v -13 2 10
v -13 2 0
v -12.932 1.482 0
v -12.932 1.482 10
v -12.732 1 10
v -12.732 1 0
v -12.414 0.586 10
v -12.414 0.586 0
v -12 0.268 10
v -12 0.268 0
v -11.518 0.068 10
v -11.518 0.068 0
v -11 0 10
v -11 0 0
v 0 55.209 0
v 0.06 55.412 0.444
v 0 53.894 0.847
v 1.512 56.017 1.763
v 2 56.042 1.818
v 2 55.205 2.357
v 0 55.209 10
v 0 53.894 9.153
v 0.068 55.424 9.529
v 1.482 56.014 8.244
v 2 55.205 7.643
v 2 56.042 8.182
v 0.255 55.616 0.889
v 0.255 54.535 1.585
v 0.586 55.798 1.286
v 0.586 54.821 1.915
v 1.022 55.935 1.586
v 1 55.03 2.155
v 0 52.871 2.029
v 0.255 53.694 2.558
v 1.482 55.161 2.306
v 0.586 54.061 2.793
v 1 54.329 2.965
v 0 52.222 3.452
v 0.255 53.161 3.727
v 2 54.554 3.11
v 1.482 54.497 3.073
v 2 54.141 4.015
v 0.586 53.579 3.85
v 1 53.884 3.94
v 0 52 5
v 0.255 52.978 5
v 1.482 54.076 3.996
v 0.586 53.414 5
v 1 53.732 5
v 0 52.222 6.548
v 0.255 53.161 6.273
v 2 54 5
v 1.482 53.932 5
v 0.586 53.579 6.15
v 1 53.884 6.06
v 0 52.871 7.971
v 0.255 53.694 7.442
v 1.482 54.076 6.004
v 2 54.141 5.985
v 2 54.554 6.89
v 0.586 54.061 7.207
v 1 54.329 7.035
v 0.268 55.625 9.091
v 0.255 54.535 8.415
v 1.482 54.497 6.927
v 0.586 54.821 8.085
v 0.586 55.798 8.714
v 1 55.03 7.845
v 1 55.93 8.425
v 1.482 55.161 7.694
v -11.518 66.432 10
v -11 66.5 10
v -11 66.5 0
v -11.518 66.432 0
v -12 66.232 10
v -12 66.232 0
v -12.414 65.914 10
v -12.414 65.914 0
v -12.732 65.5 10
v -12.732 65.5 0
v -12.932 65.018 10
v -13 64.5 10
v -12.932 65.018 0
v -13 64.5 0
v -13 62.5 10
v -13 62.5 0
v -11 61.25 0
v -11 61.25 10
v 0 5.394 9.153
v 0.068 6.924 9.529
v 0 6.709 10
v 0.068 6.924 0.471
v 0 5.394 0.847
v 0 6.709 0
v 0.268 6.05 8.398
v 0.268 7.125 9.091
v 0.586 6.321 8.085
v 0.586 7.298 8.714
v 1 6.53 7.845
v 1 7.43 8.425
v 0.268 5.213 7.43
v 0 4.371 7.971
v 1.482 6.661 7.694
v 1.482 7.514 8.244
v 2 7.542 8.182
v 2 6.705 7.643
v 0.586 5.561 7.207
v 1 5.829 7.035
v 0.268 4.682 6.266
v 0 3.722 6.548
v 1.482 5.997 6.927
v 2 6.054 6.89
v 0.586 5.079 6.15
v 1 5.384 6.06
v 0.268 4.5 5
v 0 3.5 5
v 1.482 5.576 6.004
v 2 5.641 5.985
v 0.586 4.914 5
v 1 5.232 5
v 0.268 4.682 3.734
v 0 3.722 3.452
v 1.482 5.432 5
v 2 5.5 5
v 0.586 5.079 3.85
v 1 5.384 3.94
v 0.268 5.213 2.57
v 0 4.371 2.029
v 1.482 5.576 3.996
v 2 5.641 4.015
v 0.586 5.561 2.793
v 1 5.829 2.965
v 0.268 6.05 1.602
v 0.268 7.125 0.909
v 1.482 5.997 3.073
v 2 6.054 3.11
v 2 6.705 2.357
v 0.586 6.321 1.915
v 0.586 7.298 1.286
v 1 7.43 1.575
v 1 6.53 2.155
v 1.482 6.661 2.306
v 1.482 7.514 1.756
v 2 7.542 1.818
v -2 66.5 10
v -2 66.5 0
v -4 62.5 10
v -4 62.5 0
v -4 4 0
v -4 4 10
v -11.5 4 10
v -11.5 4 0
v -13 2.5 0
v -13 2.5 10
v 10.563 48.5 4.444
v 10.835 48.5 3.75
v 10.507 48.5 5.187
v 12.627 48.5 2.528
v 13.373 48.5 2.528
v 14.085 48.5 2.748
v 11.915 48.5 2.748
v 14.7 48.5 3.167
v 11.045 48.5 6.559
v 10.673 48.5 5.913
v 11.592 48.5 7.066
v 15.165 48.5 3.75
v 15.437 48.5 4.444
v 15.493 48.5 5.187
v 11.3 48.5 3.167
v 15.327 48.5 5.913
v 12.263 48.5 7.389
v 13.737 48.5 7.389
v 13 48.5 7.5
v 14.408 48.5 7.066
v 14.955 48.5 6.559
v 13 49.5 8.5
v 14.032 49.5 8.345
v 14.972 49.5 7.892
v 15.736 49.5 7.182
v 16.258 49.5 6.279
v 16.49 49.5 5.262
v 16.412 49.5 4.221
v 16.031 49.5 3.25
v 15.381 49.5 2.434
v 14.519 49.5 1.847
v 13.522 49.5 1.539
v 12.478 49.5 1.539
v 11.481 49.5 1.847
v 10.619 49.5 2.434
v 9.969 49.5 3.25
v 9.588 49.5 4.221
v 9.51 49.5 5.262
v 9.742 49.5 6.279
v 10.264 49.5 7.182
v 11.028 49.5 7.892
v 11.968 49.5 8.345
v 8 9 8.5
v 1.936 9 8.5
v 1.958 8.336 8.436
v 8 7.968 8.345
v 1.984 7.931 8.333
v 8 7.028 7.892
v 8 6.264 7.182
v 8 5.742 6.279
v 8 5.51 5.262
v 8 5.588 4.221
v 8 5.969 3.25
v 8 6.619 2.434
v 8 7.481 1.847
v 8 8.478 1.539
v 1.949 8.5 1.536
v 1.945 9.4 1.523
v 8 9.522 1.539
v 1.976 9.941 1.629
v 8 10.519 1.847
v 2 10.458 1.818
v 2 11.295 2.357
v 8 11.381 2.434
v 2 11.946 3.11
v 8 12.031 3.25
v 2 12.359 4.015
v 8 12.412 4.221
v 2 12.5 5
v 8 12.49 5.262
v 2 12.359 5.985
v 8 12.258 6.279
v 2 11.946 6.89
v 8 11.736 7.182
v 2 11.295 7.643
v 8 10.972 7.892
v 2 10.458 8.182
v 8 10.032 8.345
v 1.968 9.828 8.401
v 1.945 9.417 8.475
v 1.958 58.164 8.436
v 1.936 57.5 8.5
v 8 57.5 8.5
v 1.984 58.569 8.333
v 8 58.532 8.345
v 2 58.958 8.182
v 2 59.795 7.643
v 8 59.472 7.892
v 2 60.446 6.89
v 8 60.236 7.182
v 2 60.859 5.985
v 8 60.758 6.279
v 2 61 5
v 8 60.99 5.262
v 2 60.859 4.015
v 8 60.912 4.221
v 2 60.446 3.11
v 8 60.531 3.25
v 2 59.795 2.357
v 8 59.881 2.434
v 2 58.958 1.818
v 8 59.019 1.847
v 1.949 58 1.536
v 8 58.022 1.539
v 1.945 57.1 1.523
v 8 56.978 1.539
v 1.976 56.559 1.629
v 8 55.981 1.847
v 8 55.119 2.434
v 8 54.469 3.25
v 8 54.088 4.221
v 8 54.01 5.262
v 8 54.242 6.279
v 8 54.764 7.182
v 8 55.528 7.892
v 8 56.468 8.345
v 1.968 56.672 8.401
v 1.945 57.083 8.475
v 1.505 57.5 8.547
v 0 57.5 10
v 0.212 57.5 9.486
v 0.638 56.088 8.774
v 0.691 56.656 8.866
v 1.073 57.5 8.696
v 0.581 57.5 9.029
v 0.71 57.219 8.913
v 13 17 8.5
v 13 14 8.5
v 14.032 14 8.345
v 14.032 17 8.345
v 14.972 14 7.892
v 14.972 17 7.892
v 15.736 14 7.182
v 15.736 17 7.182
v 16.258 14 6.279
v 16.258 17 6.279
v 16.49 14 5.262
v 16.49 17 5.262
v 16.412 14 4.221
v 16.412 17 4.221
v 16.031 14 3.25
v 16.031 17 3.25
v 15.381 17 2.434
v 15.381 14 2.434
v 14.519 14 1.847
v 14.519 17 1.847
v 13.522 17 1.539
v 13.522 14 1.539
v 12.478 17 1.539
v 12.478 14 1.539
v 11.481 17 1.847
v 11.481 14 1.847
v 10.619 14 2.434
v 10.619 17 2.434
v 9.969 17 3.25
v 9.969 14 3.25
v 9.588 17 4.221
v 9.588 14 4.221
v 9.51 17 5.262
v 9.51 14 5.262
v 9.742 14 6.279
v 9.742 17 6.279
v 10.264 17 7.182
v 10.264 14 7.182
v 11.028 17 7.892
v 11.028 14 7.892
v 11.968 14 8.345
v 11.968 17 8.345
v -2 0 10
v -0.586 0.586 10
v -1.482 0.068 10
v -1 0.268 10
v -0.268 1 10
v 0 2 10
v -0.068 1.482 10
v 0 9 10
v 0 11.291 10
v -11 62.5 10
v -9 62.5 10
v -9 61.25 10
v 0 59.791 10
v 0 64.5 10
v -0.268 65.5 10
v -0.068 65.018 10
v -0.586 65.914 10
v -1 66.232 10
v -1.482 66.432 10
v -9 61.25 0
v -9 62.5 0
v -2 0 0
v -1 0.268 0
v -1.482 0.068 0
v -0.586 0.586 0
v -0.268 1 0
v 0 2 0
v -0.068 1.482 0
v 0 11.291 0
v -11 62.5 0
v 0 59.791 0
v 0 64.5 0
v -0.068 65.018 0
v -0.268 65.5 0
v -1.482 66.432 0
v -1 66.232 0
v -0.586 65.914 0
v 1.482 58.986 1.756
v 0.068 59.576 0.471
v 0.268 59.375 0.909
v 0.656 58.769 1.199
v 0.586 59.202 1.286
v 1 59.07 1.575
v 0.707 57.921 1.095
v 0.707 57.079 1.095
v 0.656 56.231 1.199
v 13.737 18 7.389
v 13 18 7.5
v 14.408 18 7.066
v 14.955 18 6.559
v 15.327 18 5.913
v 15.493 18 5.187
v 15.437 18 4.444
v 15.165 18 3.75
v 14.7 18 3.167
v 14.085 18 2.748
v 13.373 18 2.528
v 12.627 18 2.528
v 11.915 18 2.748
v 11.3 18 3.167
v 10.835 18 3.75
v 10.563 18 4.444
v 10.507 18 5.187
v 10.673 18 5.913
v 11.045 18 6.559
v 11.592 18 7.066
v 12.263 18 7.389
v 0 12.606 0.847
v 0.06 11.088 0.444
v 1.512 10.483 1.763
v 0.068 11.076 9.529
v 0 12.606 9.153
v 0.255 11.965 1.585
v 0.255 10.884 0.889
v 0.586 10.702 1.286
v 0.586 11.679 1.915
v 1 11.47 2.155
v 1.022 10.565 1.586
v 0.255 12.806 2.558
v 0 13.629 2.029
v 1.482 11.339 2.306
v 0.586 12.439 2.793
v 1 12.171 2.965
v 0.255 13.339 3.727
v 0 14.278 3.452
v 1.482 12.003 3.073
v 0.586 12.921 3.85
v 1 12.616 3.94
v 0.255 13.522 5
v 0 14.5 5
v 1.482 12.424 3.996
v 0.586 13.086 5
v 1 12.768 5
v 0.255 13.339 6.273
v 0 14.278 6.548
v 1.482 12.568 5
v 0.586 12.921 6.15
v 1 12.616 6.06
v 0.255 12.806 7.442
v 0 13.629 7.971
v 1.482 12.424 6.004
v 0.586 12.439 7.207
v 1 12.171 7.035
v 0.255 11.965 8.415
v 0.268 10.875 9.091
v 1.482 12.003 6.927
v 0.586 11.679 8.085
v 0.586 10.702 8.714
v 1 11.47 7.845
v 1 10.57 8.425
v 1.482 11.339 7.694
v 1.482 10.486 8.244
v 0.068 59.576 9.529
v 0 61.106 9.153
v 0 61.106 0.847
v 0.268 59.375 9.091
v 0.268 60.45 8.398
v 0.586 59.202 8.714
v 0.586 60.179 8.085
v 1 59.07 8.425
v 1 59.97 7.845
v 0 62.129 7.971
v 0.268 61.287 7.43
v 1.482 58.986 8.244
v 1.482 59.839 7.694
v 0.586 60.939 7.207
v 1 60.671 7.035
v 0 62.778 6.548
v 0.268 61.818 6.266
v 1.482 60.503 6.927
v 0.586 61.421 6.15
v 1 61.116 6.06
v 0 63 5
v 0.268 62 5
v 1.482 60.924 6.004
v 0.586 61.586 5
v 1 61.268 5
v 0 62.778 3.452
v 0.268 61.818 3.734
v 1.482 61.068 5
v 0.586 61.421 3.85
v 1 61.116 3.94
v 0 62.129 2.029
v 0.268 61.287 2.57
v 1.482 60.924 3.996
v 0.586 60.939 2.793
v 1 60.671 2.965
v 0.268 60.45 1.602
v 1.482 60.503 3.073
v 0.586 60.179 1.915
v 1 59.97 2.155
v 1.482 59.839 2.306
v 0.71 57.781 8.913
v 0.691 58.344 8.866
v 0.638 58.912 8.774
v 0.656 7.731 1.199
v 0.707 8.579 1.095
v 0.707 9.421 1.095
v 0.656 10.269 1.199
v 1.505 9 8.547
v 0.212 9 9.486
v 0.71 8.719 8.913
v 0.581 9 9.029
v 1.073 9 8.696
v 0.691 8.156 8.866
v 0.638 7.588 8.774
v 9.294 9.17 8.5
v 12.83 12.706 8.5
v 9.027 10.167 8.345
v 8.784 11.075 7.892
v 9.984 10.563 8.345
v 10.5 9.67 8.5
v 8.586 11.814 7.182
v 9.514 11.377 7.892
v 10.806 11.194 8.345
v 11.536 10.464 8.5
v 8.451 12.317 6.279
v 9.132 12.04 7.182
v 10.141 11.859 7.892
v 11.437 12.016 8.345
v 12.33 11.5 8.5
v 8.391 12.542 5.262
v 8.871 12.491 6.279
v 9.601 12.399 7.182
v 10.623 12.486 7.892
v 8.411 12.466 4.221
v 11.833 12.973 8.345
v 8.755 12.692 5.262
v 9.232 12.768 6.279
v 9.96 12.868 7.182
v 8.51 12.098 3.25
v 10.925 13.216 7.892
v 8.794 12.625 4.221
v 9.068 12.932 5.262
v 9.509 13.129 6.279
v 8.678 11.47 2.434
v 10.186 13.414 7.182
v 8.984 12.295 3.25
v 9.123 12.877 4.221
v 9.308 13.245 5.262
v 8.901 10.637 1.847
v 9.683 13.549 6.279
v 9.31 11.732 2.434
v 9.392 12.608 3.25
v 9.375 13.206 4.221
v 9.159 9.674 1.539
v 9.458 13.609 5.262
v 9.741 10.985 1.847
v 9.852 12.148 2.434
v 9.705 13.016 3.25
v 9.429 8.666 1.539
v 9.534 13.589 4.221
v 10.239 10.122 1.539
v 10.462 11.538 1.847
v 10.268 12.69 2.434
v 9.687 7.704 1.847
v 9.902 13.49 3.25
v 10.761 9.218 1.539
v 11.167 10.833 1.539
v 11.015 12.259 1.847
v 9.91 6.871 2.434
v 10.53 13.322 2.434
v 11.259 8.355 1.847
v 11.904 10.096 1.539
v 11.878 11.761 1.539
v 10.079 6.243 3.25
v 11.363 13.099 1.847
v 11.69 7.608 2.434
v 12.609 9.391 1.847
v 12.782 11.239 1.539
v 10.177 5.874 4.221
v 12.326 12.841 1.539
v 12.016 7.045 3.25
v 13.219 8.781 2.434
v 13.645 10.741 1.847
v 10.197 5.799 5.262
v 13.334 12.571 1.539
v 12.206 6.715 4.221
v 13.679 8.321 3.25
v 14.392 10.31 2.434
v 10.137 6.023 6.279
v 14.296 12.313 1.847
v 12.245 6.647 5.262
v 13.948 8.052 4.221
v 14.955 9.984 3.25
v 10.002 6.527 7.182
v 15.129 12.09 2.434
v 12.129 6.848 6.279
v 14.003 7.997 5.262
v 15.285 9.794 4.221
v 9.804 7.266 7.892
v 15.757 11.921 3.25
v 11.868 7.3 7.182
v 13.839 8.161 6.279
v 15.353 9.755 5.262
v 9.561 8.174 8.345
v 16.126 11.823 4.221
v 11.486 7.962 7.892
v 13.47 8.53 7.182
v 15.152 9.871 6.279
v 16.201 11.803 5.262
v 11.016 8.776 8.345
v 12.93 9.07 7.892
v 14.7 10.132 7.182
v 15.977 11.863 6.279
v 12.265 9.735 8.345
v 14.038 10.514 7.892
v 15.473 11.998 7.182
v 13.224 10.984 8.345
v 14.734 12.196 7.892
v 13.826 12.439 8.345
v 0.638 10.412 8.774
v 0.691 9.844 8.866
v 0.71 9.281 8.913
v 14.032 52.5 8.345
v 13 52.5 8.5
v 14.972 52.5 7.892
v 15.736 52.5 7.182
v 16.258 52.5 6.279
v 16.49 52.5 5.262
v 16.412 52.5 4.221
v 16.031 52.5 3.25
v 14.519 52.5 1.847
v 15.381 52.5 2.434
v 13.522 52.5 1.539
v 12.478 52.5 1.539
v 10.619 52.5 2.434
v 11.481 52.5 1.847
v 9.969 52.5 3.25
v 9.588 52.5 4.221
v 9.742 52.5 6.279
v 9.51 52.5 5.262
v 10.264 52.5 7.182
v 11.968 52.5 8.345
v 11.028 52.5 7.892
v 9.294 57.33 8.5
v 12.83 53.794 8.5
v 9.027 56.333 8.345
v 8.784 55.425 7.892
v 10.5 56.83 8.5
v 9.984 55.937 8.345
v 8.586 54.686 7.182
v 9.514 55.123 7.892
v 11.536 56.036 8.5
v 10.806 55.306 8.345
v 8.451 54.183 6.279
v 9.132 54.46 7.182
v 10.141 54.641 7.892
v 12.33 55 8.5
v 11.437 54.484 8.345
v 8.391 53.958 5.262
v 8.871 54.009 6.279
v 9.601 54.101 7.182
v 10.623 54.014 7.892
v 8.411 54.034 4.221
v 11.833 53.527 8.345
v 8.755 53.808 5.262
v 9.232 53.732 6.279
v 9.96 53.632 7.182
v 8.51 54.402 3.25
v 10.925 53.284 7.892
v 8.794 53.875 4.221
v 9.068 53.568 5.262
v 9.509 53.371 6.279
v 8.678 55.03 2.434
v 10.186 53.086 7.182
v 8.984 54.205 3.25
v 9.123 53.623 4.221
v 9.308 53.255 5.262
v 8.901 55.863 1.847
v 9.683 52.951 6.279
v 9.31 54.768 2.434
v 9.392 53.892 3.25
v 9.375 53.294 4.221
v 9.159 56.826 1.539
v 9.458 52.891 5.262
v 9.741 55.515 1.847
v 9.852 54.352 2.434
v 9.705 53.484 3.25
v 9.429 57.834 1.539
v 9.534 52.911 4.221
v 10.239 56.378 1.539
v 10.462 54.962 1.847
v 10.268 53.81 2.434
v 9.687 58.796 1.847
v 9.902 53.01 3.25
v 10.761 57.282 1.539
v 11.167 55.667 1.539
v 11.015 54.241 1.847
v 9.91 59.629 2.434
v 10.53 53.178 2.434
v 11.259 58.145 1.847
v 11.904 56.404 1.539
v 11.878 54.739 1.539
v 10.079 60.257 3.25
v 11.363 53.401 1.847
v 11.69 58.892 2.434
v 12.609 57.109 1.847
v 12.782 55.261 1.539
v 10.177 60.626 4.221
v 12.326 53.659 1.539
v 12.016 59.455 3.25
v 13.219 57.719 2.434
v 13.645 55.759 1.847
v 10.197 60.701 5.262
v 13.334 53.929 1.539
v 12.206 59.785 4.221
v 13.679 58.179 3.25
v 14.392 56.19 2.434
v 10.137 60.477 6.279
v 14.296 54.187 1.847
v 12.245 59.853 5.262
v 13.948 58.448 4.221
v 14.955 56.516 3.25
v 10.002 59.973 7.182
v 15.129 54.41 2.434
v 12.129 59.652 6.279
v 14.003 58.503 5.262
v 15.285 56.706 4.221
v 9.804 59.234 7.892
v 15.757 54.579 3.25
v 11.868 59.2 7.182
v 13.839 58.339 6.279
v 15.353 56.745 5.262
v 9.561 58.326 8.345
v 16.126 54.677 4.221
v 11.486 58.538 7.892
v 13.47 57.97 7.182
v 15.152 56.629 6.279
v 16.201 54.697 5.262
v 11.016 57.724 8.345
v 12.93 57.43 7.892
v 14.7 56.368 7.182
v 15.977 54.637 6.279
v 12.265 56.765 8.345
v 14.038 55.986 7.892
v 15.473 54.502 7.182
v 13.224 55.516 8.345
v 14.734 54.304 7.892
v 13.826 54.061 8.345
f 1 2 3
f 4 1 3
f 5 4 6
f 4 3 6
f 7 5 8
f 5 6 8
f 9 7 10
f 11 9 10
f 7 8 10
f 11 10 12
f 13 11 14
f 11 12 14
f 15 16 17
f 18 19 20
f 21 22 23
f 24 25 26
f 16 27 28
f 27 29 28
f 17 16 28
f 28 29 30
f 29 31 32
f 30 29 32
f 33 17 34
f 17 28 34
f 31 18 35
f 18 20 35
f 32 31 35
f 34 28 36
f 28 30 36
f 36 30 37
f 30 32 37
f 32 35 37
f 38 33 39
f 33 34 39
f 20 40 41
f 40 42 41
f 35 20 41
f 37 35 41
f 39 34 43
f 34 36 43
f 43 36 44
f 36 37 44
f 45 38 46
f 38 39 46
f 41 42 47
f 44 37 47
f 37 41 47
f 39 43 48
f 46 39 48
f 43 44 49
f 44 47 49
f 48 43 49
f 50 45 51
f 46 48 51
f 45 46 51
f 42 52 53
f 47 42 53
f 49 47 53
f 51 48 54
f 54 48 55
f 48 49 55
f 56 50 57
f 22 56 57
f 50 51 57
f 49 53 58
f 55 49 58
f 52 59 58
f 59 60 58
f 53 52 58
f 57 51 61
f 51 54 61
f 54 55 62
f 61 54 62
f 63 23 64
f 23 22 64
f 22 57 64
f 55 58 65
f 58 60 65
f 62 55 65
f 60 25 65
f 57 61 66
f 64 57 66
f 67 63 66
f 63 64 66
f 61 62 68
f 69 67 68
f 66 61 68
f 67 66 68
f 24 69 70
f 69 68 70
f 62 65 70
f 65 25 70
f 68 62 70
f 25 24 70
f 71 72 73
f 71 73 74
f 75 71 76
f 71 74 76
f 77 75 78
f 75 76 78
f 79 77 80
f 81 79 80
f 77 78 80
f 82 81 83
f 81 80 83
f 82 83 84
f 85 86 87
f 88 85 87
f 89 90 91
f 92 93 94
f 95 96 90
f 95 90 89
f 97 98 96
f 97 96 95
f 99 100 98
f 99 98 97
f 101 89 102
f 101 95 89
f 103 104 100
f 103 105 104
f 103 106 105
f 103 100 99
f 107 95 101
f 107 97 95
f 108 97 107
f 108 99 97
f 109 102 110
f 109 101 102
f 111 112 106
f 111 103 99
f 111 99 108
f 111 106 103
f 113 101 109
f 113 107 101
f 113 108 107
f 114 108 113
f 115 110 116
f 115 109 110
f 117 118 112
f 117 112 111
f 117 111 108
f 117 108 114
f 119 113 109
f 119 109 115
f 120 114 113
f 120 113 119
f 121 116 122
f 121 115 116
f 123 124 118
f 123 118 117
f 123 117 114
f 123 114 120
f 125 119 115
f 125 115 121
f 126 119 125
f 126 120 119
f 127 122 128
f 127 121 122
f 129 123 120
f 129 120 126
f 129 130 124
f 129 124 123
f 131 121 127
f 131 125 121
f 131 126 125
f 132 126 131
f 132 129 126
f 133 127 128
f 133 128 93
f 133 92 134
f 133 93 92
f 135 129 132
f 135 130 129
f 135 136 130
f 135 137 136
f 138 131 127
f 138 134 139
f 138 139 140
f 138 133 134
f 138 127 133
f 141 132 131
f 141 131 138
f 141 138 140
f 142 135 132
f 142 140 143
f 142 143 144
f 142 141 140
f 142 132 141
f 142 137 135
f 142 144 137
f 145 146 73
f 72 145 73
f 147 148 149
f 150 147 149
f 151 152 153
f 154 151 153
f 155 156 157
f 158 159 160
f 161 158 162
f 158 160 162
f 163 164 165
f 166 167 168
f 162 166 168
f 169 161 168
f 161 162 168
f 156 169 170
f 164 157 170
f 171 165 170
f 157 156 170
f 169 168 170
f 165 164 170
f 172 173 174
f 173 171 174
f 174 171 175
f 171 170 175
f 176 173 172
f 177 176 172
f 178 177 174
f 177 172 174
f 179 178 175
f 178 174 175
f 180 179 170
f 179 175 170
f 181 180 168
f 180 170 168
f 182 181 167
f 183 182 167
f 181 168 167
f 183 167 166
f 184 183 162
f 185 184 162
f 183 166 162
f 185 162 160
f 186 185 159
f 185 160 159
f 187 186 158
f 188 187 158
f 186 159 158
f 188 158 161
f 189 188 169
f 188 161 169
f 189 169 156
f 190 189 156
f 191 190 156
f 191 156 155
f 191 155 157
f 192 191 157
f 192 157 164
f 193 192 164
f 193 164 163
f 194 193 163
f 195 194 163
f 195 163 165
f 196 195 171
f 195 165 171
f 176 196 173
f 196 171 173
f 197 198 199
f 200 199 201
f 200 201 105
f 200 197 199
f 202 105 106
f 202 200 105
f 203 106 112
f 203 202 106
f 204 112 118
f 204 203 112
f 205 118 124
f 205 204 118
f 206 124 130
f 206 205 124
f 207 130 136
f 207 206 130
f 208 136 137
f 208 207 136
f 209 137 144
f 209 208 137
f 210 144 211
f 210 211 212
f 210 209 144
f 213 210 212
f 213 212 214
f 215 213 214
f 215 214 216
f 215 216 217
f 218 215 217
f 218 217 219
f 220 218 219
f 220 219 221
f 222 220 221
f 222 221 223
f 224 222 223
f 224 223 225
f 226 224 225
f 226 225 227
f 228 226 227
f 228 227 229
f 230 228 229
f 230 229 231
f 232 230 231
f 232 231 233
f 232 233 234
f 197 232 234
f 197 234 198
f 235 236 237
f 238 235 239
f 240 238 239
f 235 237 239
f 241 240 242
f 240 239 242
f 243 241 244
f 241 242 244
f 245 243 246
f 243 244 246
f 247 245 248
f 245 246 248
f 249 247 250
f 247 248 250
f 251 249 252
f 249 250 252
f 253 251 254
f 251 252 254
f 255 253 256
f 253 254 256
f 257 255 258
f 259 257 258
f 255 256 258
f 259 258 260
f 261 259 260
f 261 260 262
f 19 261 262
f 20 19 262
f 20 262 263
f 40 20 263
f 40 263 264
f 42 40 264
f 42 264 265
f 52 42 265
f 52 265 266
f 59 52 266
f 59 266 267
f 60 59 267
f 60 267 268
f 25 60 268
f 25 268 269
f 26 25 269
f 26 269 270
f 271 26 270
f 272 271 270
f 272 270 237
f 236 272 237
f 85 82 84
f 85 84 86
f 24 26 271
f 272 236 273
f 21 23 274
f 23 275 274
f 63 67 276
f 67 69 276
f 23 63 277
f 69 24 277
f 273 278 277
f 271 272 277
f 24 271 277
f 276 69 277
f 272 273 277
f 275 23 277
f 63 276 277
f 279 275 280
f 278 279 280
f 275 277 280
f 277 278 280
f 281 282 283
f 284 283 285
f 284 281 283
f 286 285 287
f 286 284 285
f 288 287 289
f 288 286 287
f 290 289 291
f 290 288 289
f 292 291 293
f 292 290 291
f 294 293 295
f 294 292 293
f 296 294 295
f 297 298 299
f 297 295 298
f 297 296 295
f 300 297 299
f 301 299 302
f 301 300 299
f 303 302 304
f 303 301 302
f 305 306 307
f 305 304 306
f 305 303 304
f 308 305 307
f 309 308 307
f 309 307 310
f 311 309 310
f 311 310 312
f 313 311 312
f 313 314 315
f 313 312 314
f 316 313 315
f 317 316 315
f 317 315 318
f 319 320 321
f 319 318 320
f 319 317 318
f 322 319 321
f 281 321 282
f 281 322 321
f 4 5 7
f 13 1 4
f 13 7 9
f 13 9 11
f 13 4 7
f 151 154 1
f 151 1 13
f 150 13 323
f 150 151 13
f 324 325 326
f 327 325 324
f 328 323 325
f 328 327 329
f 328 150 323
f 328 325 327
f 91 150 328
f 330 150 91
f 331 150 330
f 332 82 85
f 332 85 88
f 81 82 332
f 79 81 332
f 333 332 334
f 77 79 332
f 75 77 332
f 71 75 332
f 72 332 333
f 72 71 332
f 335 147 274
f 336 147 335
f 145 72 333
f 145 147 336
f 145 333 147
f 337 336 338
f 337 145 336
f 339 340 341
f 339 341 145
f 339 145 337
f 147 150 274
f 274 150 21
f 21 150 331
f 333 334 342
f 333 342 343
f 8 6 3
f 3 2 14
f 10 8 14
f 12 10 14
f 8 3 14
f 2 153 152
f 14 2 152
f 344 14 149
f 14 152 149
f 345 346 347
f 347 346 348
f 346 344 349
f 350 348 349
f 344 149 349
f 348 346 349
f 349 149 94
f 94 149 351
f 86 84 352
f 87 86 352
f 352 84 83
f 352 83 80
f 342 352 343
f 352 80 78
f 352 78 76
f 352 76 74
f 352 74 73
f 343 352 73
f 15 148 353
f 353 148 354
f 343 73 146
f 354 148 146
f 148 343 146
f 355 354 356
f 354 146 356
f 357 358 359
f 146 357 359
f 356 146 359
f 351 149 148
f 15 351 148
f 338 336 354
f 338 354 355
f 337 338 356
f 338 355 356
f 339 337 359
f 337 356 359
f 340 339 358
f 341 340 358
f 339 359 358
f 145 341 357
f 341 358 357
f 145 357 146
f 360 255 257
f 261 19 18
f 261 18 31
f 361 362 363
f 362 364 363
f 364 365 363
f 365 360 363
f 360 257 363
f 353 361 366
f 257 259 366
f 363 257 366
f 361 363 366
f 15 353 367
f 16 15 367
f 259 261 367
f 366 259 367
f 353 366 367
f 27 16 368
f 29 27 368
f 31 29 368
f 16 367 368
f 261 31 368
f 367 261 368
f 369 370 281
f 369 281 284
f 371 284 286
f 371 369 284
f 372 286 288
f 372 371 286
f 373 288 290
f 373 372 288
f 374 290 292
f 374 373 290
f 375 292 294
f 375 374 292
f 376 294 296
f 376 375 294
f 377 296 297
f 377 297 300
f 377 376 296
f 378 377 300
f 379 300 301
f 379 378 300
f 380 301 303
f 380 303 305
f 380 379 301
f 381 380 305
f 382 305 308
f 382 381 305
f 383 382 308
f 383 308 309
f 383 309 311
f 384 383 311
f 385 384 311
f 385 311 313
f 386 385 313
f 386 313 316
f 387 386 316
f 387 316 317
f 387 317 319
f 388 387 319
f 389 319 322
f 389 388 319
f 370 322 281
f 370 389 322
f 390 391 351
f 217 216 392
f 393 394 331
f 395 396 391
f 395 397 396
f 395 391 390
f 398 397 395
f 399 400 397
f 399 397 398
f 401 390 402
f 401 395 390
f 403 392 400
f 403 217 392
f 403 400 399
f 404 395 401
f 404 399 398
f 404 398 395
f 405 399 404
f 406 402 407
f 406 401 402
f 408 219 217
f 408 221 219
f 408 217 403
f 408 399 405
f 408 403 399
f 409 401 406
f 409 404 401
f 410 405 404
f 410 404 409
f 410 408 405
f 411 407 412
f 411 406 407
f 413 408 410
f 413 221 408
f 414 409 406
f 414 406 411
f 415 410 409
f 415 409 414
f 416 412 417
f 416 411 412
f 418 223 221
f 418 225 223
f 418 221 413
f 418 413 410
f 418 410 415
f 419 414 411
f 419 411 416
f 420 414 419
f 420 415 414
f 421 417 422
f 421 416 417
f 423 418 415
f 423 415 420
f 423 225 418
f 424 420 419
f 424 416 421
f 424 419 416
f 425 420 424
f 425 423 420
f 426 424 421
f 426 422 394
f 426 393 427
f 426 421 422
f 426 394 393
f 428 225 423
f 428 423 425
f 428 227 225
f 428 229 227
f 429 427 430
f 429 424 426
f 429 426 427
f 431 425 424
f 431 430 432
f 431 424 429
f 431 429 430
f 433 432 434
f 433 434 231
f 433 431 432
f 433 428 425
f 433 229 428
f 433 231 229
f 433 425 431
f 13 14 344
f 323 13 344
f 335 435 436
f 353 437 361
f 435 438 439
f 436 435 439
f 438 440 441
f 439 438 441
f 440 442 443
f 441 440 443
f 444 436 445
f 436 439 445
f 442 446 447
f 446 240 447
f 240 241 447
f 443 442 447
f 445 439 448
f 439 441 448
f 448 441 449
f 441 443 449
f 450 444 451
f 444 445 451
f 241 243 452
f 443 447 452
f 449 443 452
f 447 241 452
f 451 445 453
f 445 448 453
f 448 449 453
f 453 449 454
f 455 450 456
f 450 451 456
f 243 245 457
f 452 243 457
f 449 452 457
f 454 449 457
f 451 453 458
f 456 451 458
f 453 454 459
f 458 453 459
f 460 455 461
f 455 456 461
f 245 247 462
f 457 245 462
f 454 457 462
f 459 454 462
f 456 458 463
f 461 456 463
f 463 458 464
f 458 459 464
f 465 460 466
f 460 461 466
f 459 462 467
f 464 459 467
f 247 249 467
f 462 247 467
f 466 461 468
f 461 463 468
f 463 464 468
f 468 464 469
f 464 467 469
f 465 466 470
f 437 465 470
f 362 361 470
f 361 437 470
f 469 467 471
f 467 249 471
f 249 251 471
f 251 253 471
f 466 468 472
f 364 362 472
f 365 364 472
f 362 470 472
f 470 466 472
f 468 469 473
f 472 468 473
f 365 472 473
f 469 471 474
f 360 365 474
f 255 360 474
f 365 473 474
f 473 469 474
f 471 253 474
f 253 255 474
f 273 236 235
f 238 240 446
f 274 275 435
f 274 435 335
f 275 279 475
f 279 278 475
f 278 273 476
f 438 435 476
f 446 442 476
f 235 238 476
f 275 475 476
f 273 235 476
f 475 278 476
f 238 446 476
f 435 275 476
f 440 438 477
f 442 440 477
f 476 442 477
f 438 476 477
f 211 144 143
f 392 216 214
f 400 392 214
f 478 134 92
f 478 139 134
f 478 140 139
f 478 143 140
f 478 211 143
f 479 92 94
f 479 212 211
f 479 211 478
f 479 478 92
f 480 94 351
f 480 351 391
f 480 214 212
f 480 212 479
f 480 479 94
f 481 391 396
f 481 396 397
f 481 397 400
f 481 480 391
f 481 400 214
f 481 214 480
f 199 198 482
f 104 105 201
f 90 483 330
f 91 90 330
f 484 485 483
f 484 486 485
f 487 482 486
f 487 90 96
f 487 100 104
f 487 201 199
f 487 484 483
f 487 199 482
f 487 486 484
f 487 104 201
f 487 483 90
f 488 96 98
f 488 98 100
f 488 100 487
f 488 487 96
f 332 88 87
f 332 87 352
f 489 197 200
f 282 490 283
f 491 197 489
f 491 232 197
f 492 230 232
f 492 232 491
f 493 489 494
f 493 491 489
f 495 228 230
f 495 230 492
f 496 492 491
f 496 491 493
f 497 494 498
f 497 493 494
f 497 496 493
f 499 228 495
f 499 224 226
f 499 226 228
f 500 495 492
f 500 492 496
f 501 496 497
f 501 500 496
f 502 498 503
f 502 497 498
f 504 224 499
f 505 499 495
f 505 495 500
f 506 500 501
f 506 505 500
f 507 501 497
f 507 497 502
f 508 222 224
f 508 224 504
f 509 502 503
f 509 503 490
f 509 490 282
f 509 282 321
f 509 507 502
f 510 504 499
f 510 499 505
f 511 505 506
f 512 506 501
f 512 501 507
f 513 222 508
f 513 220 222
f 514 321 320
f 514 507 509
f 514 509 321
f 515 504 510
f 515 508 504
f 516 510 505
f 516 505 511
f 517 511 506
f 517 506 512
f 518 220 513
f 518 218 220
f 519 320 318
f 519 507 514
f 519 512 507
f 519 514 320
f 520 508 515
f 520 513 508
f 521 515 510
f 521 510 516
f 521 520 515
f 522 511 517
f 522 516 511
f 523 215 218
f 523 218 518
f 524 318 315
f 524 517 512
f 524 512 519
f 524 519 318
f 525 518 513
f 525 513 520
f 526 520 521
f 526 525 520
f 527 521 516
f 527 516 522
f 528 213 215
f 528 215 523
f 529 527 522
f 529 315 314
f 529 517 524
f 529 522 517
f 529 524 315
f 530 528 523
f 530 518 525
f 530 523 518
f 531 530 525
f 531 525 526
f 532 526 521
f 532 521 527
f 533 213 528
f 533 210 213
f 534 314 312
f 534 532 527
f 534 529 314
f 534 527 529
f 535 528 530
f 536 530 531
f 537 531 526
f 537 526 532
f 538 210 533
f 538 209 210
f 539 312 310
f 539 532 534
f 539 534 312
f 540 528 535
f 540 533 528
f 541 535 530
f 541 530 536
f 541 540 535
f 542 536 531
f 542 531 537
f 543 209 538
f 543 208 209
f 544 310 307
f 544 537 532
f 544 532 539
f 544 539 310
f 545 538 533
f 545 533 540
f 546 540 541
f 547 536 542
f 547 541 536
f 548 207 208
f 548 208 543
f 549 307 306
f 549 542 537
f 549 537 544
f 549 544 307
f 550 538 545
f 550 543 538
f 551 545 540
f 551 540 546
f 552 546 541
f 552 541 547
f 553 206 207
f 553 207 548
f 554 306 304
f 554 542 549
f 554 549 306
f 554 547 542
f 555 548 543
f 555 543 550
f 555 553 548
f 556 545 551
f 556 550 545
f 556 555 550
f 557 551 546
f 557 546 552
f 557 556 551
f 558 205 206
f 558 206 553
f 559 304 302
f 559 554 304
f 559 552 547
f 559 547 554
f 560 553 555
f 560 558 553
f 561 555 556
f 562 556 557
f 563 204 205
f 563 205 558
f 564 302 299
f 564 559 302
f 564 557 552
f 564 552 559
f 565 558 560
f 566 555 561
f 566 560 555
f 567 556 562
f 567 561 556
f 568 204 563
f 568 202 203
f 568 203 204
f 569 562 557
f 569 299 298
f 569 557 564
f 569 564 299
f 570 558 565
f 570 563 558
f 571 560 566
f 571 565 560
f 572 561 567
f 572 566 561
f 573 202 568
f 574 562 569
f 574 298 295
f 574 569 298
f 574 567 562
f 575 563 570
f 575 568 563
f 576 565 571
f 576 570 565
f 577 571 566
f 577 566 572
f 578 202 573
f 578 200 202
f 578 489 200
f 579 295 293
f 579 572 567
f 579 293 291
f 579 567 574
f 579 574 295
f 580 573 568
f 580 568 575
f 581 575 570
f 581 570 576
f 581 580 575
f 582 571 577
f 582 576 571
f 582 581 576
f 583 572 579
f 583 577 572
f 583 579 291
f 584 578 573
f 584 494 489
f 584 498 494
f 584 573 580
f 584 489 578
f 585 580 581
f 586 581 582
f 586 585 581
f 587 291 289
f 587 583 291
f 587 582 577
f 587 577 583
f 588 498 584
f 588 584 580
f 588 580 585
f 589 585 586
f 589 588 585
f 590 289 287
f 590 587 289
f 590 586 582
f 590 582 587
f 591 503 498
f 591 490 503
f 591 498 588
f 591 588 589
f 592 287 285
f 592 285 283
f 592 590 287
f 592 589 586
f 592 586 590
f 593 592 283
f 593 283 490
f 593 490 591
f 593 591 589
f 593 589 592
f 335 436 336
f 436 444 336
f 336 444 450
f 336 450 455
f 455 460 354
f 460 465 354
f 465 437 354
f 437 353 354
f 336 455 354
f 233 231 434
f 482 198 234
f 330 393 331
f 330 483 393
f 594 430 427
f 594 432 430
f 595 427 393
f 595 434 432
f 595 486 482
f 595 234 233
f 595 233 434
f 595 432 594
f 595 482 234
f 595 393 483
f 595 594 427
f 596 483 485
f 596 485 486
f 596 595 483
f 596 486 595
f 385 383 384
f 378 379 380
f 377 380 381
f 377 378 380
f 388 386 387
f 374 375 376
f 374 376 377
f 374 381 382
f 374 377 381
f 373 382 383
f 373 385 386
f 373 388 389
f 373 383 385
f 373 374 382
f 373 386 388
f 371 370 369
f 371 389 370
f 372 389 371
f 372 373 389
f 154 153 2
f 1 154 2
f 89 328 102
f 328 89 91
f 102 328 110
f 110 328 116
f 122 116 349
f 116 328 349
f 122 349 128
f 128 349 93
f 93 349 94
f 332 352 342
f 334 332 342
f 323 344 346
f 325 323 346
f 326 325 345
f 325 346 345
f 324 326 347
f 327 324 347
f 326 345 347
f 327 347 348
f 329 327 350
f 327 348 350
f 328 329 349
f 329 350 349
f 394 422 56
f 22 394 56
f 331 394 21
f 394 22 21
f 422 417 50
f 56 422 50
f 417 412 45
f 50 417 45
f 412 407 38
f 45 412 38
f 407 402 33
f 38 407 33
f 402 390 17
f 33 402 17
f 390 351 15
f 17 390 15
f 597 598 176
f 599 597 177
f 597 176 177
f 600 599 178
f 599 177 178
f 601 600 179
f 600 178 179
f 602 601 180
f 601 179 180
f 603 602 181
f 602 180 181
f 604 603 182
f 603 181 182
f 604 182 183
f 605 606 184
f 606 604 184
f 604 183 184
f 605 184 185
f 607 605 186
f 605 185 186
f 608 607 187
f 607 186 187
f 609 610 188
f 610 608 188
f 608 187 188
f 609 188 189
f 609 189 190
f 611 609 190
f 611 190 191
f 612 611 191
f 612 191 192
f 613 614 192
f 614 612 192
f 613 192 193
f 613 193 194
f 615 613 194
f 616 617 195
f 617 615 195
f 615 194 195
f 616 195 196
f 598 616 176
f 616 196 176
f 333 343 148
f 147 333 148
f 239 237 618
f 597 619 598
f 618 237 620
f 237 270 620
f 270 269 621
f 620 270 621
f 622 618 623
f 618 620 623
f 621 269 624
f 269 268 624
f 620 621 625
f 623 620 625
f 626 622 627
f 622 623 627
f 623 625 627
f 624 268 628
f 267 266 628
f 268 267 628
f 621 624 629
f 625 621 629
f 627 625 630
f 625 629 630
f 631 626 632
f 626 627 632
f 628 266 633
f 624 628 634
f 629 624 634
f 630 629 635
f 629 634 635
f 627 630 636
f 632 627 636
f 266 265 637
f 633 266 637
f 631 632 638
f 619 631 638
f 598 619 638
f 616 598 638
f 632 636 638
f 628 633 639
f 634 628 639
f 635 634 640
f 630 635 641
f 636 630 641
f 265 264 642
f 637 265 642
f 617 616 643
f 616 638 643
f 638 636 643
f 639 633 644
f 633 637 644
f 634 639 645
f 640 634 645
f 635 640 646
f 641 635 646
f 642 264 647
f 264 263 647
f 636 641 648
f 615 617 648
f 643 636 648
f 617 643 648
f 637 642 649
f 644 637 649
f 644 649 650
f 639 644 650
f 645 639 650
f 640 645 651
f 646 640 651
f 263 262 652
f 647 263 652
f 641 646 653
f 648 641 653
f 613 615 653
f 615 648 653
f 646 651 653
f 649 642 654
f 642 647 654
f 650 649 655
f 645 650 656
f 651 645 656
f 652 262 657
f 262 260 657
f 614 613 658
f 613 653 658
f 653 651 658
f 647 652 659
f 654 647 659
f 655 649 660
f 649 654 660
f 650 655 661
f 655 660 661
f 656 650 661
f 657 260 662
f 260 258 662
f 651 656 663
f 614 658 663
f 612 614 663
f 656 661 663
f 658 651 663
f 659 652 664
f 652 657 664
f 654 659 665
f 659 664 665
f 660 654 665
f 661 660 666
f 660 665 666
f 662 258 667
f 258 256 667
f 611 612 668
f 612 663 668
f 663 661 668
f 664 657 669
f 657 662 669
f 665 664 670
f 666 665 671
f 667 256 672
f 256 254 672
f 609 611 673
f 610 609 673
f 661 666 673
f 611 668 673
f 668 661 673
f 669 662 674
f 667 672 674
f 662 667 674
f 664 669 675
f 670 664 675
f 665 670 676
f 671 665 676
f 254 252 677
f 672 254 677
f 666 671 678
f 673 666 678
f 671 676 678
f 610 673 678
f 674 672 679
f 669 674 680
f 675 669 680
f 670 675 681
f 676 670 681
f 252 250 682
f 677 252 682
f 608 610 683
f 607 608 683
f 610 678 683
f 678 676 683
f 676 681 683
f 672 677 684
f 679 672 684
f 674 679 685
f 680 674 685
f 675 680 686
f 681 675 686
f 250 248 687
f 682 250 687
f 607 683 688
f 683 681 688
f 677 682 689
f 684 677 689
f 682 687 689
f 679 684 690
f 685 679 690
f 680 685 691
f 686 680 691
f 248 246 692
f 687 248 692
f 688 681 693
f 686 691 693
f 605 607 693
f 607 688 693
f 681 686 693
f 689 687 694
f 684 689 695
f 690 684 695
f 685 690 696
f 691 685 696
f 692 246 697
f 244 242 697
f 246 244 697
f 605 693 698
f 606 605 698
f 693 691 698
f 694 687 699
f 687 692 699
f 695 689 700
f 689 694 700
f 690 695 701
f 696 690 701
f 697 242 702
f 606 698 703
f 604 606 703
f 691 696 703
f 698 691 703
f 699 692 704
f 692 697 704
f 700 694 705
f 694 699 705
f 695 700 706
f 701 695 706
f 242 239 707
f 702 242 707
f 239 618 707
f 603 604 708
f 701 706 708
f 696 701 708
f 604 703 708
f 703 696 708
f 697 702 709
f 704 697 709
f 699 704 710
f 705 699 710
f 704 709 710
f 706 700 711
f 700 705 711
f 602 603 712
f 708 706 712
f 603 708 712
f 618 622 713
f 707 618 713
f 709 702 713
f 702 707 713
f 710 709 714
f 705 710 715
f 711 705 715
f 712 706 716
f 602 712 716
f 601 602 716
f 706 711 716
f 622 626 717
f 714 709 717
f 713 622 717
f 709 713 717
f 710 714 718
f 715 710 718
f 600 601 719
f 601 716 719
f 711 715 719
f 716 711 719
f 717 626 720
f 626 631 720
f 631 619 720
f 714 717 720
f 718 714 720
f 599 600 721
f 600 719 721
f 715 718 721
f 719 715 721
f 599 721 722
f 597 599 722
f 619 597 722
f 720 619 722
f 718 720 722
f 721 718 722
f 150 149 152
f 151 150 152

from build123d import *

# Parameters (mm, degrees)
BOSS_EXTRUDE1_DEPTH      = 10
SWEEP1_PROFILE_R         = 3.5
FILLET1_R                = 2
CHAMFER1_SIZE            = 1
FILLET1_OF_MIRROR1_R     = 2
CHAMFER1_OF_MIRROR1_SIZE = 1


with BuildPart() as part:
    # Sketch1 → Boss-Extrude1 (new body)
    with BuildSketch(Plane.XY):
        with BuildLine():
            Line((-13, 62.5), (-11, 61.25))
            Line((-11, 61.25), (-11, 62.5))
            Line((-11, 62.5), (-9, 61.25))
            Line((-9, 61.25), (-9, 62.5))
            Line((-9, 62.5), (-4, 62.5))
            Line((-4, 62.5), (-4, 4))
            Line((-4, 4), (-11.5, 4))
            Line((-11.5, 4), (-13, 2.5))
            Line((-13, 2.5), (-13, 2))
            ThreePointArc((-13, 2), (-12.414213562, 0.585786438), (-11, 0))
            Line((-11, 0), (-2, 0))
            ThreePointArc((-2, 0), (-0.585786438, 0.585786438), (0, 2))
            Line((0, 2), (0, 64.5))
            ThreePointArc((0, 64.5), (-0.585786438, 65.914213562), (-2, 66.5))
            Line((-2, 66.5), (-4, 66.5))
            Line((-4, 66.5), (-11, 66.5))
            ThreePointArc((-11, 66.5), (-12.414213562, 65.914213562), (-13, 64.5))
            Line((-13, 64.5), (-13, 62.5))
        make_face()
    extrude(amount=BOSS_EXTRUDE1_DEPTH)

    # Sweep1: sweep along a curve in space
    with BuildLine() as sweep1_path:
        Line((0, 9, 5), (8, 9, 5))
        ThreePointArc((8, 9, 5), (11.535533906, 10.464466094, 5), (13, 14, 5))
        Line((13, 14, 5), (13, 18, 5))
    # Sweep1 profile (on start of the path) → Sweep1 (sweep)
    with BuildSketch(Plane(origin=(0, 9, 5), x_dir=(0, 0, 1), z_dir=(1, 0, 0))):
        Circle(SWEEP1_PROFILE_R)
    sweep1 = sweep(path=sweep1_path.line)

    # Fillet1
    fillet1_edges = [part.edges().sort_by_distance(p)[0] for p in [
        (0, 9, 1.5),
    ]]
    fillet(fillet1_edges, radius=FILLET1_R)

    # Chamfer1
    chamfer1_edges = [part.edges().sort_by_distance(p)[0] for p in [
        (13, 18, 1.5),
    ]]
    chamfer(chamfer1_edges, length=CHAMFER1_SIZE)

    # Mirror1: Sweep1 across plane
    add(sweep1.mirror(Plane(origin=(0, 33.25, 0), x_dir=(0, 0, 1), z_dir=(0, -1, 0))))

    # Fillet1 of Mirror1
    fillet1_of_mirror1_edges = [part.edges().sort_by_distance(p)[0] for p in [
        (0, 57.5, 1.5),
    ]]
    fillet(fillet1_of_mirror1_edges, radius=FILLET1_OF_MIRROR1_R)

    # Chamfer1 of Mirror1
    chamfer1_of_mirror1_edges = [part.edges().sort_by_distance(p)[0] for p in [
        (13, 48.5, 1.5),
    ]]
    chamfer(chamfer1_of_mirror1_edges, length=CHAMFER1_OF_MIRROR1_SIZE)


solid = part.part
